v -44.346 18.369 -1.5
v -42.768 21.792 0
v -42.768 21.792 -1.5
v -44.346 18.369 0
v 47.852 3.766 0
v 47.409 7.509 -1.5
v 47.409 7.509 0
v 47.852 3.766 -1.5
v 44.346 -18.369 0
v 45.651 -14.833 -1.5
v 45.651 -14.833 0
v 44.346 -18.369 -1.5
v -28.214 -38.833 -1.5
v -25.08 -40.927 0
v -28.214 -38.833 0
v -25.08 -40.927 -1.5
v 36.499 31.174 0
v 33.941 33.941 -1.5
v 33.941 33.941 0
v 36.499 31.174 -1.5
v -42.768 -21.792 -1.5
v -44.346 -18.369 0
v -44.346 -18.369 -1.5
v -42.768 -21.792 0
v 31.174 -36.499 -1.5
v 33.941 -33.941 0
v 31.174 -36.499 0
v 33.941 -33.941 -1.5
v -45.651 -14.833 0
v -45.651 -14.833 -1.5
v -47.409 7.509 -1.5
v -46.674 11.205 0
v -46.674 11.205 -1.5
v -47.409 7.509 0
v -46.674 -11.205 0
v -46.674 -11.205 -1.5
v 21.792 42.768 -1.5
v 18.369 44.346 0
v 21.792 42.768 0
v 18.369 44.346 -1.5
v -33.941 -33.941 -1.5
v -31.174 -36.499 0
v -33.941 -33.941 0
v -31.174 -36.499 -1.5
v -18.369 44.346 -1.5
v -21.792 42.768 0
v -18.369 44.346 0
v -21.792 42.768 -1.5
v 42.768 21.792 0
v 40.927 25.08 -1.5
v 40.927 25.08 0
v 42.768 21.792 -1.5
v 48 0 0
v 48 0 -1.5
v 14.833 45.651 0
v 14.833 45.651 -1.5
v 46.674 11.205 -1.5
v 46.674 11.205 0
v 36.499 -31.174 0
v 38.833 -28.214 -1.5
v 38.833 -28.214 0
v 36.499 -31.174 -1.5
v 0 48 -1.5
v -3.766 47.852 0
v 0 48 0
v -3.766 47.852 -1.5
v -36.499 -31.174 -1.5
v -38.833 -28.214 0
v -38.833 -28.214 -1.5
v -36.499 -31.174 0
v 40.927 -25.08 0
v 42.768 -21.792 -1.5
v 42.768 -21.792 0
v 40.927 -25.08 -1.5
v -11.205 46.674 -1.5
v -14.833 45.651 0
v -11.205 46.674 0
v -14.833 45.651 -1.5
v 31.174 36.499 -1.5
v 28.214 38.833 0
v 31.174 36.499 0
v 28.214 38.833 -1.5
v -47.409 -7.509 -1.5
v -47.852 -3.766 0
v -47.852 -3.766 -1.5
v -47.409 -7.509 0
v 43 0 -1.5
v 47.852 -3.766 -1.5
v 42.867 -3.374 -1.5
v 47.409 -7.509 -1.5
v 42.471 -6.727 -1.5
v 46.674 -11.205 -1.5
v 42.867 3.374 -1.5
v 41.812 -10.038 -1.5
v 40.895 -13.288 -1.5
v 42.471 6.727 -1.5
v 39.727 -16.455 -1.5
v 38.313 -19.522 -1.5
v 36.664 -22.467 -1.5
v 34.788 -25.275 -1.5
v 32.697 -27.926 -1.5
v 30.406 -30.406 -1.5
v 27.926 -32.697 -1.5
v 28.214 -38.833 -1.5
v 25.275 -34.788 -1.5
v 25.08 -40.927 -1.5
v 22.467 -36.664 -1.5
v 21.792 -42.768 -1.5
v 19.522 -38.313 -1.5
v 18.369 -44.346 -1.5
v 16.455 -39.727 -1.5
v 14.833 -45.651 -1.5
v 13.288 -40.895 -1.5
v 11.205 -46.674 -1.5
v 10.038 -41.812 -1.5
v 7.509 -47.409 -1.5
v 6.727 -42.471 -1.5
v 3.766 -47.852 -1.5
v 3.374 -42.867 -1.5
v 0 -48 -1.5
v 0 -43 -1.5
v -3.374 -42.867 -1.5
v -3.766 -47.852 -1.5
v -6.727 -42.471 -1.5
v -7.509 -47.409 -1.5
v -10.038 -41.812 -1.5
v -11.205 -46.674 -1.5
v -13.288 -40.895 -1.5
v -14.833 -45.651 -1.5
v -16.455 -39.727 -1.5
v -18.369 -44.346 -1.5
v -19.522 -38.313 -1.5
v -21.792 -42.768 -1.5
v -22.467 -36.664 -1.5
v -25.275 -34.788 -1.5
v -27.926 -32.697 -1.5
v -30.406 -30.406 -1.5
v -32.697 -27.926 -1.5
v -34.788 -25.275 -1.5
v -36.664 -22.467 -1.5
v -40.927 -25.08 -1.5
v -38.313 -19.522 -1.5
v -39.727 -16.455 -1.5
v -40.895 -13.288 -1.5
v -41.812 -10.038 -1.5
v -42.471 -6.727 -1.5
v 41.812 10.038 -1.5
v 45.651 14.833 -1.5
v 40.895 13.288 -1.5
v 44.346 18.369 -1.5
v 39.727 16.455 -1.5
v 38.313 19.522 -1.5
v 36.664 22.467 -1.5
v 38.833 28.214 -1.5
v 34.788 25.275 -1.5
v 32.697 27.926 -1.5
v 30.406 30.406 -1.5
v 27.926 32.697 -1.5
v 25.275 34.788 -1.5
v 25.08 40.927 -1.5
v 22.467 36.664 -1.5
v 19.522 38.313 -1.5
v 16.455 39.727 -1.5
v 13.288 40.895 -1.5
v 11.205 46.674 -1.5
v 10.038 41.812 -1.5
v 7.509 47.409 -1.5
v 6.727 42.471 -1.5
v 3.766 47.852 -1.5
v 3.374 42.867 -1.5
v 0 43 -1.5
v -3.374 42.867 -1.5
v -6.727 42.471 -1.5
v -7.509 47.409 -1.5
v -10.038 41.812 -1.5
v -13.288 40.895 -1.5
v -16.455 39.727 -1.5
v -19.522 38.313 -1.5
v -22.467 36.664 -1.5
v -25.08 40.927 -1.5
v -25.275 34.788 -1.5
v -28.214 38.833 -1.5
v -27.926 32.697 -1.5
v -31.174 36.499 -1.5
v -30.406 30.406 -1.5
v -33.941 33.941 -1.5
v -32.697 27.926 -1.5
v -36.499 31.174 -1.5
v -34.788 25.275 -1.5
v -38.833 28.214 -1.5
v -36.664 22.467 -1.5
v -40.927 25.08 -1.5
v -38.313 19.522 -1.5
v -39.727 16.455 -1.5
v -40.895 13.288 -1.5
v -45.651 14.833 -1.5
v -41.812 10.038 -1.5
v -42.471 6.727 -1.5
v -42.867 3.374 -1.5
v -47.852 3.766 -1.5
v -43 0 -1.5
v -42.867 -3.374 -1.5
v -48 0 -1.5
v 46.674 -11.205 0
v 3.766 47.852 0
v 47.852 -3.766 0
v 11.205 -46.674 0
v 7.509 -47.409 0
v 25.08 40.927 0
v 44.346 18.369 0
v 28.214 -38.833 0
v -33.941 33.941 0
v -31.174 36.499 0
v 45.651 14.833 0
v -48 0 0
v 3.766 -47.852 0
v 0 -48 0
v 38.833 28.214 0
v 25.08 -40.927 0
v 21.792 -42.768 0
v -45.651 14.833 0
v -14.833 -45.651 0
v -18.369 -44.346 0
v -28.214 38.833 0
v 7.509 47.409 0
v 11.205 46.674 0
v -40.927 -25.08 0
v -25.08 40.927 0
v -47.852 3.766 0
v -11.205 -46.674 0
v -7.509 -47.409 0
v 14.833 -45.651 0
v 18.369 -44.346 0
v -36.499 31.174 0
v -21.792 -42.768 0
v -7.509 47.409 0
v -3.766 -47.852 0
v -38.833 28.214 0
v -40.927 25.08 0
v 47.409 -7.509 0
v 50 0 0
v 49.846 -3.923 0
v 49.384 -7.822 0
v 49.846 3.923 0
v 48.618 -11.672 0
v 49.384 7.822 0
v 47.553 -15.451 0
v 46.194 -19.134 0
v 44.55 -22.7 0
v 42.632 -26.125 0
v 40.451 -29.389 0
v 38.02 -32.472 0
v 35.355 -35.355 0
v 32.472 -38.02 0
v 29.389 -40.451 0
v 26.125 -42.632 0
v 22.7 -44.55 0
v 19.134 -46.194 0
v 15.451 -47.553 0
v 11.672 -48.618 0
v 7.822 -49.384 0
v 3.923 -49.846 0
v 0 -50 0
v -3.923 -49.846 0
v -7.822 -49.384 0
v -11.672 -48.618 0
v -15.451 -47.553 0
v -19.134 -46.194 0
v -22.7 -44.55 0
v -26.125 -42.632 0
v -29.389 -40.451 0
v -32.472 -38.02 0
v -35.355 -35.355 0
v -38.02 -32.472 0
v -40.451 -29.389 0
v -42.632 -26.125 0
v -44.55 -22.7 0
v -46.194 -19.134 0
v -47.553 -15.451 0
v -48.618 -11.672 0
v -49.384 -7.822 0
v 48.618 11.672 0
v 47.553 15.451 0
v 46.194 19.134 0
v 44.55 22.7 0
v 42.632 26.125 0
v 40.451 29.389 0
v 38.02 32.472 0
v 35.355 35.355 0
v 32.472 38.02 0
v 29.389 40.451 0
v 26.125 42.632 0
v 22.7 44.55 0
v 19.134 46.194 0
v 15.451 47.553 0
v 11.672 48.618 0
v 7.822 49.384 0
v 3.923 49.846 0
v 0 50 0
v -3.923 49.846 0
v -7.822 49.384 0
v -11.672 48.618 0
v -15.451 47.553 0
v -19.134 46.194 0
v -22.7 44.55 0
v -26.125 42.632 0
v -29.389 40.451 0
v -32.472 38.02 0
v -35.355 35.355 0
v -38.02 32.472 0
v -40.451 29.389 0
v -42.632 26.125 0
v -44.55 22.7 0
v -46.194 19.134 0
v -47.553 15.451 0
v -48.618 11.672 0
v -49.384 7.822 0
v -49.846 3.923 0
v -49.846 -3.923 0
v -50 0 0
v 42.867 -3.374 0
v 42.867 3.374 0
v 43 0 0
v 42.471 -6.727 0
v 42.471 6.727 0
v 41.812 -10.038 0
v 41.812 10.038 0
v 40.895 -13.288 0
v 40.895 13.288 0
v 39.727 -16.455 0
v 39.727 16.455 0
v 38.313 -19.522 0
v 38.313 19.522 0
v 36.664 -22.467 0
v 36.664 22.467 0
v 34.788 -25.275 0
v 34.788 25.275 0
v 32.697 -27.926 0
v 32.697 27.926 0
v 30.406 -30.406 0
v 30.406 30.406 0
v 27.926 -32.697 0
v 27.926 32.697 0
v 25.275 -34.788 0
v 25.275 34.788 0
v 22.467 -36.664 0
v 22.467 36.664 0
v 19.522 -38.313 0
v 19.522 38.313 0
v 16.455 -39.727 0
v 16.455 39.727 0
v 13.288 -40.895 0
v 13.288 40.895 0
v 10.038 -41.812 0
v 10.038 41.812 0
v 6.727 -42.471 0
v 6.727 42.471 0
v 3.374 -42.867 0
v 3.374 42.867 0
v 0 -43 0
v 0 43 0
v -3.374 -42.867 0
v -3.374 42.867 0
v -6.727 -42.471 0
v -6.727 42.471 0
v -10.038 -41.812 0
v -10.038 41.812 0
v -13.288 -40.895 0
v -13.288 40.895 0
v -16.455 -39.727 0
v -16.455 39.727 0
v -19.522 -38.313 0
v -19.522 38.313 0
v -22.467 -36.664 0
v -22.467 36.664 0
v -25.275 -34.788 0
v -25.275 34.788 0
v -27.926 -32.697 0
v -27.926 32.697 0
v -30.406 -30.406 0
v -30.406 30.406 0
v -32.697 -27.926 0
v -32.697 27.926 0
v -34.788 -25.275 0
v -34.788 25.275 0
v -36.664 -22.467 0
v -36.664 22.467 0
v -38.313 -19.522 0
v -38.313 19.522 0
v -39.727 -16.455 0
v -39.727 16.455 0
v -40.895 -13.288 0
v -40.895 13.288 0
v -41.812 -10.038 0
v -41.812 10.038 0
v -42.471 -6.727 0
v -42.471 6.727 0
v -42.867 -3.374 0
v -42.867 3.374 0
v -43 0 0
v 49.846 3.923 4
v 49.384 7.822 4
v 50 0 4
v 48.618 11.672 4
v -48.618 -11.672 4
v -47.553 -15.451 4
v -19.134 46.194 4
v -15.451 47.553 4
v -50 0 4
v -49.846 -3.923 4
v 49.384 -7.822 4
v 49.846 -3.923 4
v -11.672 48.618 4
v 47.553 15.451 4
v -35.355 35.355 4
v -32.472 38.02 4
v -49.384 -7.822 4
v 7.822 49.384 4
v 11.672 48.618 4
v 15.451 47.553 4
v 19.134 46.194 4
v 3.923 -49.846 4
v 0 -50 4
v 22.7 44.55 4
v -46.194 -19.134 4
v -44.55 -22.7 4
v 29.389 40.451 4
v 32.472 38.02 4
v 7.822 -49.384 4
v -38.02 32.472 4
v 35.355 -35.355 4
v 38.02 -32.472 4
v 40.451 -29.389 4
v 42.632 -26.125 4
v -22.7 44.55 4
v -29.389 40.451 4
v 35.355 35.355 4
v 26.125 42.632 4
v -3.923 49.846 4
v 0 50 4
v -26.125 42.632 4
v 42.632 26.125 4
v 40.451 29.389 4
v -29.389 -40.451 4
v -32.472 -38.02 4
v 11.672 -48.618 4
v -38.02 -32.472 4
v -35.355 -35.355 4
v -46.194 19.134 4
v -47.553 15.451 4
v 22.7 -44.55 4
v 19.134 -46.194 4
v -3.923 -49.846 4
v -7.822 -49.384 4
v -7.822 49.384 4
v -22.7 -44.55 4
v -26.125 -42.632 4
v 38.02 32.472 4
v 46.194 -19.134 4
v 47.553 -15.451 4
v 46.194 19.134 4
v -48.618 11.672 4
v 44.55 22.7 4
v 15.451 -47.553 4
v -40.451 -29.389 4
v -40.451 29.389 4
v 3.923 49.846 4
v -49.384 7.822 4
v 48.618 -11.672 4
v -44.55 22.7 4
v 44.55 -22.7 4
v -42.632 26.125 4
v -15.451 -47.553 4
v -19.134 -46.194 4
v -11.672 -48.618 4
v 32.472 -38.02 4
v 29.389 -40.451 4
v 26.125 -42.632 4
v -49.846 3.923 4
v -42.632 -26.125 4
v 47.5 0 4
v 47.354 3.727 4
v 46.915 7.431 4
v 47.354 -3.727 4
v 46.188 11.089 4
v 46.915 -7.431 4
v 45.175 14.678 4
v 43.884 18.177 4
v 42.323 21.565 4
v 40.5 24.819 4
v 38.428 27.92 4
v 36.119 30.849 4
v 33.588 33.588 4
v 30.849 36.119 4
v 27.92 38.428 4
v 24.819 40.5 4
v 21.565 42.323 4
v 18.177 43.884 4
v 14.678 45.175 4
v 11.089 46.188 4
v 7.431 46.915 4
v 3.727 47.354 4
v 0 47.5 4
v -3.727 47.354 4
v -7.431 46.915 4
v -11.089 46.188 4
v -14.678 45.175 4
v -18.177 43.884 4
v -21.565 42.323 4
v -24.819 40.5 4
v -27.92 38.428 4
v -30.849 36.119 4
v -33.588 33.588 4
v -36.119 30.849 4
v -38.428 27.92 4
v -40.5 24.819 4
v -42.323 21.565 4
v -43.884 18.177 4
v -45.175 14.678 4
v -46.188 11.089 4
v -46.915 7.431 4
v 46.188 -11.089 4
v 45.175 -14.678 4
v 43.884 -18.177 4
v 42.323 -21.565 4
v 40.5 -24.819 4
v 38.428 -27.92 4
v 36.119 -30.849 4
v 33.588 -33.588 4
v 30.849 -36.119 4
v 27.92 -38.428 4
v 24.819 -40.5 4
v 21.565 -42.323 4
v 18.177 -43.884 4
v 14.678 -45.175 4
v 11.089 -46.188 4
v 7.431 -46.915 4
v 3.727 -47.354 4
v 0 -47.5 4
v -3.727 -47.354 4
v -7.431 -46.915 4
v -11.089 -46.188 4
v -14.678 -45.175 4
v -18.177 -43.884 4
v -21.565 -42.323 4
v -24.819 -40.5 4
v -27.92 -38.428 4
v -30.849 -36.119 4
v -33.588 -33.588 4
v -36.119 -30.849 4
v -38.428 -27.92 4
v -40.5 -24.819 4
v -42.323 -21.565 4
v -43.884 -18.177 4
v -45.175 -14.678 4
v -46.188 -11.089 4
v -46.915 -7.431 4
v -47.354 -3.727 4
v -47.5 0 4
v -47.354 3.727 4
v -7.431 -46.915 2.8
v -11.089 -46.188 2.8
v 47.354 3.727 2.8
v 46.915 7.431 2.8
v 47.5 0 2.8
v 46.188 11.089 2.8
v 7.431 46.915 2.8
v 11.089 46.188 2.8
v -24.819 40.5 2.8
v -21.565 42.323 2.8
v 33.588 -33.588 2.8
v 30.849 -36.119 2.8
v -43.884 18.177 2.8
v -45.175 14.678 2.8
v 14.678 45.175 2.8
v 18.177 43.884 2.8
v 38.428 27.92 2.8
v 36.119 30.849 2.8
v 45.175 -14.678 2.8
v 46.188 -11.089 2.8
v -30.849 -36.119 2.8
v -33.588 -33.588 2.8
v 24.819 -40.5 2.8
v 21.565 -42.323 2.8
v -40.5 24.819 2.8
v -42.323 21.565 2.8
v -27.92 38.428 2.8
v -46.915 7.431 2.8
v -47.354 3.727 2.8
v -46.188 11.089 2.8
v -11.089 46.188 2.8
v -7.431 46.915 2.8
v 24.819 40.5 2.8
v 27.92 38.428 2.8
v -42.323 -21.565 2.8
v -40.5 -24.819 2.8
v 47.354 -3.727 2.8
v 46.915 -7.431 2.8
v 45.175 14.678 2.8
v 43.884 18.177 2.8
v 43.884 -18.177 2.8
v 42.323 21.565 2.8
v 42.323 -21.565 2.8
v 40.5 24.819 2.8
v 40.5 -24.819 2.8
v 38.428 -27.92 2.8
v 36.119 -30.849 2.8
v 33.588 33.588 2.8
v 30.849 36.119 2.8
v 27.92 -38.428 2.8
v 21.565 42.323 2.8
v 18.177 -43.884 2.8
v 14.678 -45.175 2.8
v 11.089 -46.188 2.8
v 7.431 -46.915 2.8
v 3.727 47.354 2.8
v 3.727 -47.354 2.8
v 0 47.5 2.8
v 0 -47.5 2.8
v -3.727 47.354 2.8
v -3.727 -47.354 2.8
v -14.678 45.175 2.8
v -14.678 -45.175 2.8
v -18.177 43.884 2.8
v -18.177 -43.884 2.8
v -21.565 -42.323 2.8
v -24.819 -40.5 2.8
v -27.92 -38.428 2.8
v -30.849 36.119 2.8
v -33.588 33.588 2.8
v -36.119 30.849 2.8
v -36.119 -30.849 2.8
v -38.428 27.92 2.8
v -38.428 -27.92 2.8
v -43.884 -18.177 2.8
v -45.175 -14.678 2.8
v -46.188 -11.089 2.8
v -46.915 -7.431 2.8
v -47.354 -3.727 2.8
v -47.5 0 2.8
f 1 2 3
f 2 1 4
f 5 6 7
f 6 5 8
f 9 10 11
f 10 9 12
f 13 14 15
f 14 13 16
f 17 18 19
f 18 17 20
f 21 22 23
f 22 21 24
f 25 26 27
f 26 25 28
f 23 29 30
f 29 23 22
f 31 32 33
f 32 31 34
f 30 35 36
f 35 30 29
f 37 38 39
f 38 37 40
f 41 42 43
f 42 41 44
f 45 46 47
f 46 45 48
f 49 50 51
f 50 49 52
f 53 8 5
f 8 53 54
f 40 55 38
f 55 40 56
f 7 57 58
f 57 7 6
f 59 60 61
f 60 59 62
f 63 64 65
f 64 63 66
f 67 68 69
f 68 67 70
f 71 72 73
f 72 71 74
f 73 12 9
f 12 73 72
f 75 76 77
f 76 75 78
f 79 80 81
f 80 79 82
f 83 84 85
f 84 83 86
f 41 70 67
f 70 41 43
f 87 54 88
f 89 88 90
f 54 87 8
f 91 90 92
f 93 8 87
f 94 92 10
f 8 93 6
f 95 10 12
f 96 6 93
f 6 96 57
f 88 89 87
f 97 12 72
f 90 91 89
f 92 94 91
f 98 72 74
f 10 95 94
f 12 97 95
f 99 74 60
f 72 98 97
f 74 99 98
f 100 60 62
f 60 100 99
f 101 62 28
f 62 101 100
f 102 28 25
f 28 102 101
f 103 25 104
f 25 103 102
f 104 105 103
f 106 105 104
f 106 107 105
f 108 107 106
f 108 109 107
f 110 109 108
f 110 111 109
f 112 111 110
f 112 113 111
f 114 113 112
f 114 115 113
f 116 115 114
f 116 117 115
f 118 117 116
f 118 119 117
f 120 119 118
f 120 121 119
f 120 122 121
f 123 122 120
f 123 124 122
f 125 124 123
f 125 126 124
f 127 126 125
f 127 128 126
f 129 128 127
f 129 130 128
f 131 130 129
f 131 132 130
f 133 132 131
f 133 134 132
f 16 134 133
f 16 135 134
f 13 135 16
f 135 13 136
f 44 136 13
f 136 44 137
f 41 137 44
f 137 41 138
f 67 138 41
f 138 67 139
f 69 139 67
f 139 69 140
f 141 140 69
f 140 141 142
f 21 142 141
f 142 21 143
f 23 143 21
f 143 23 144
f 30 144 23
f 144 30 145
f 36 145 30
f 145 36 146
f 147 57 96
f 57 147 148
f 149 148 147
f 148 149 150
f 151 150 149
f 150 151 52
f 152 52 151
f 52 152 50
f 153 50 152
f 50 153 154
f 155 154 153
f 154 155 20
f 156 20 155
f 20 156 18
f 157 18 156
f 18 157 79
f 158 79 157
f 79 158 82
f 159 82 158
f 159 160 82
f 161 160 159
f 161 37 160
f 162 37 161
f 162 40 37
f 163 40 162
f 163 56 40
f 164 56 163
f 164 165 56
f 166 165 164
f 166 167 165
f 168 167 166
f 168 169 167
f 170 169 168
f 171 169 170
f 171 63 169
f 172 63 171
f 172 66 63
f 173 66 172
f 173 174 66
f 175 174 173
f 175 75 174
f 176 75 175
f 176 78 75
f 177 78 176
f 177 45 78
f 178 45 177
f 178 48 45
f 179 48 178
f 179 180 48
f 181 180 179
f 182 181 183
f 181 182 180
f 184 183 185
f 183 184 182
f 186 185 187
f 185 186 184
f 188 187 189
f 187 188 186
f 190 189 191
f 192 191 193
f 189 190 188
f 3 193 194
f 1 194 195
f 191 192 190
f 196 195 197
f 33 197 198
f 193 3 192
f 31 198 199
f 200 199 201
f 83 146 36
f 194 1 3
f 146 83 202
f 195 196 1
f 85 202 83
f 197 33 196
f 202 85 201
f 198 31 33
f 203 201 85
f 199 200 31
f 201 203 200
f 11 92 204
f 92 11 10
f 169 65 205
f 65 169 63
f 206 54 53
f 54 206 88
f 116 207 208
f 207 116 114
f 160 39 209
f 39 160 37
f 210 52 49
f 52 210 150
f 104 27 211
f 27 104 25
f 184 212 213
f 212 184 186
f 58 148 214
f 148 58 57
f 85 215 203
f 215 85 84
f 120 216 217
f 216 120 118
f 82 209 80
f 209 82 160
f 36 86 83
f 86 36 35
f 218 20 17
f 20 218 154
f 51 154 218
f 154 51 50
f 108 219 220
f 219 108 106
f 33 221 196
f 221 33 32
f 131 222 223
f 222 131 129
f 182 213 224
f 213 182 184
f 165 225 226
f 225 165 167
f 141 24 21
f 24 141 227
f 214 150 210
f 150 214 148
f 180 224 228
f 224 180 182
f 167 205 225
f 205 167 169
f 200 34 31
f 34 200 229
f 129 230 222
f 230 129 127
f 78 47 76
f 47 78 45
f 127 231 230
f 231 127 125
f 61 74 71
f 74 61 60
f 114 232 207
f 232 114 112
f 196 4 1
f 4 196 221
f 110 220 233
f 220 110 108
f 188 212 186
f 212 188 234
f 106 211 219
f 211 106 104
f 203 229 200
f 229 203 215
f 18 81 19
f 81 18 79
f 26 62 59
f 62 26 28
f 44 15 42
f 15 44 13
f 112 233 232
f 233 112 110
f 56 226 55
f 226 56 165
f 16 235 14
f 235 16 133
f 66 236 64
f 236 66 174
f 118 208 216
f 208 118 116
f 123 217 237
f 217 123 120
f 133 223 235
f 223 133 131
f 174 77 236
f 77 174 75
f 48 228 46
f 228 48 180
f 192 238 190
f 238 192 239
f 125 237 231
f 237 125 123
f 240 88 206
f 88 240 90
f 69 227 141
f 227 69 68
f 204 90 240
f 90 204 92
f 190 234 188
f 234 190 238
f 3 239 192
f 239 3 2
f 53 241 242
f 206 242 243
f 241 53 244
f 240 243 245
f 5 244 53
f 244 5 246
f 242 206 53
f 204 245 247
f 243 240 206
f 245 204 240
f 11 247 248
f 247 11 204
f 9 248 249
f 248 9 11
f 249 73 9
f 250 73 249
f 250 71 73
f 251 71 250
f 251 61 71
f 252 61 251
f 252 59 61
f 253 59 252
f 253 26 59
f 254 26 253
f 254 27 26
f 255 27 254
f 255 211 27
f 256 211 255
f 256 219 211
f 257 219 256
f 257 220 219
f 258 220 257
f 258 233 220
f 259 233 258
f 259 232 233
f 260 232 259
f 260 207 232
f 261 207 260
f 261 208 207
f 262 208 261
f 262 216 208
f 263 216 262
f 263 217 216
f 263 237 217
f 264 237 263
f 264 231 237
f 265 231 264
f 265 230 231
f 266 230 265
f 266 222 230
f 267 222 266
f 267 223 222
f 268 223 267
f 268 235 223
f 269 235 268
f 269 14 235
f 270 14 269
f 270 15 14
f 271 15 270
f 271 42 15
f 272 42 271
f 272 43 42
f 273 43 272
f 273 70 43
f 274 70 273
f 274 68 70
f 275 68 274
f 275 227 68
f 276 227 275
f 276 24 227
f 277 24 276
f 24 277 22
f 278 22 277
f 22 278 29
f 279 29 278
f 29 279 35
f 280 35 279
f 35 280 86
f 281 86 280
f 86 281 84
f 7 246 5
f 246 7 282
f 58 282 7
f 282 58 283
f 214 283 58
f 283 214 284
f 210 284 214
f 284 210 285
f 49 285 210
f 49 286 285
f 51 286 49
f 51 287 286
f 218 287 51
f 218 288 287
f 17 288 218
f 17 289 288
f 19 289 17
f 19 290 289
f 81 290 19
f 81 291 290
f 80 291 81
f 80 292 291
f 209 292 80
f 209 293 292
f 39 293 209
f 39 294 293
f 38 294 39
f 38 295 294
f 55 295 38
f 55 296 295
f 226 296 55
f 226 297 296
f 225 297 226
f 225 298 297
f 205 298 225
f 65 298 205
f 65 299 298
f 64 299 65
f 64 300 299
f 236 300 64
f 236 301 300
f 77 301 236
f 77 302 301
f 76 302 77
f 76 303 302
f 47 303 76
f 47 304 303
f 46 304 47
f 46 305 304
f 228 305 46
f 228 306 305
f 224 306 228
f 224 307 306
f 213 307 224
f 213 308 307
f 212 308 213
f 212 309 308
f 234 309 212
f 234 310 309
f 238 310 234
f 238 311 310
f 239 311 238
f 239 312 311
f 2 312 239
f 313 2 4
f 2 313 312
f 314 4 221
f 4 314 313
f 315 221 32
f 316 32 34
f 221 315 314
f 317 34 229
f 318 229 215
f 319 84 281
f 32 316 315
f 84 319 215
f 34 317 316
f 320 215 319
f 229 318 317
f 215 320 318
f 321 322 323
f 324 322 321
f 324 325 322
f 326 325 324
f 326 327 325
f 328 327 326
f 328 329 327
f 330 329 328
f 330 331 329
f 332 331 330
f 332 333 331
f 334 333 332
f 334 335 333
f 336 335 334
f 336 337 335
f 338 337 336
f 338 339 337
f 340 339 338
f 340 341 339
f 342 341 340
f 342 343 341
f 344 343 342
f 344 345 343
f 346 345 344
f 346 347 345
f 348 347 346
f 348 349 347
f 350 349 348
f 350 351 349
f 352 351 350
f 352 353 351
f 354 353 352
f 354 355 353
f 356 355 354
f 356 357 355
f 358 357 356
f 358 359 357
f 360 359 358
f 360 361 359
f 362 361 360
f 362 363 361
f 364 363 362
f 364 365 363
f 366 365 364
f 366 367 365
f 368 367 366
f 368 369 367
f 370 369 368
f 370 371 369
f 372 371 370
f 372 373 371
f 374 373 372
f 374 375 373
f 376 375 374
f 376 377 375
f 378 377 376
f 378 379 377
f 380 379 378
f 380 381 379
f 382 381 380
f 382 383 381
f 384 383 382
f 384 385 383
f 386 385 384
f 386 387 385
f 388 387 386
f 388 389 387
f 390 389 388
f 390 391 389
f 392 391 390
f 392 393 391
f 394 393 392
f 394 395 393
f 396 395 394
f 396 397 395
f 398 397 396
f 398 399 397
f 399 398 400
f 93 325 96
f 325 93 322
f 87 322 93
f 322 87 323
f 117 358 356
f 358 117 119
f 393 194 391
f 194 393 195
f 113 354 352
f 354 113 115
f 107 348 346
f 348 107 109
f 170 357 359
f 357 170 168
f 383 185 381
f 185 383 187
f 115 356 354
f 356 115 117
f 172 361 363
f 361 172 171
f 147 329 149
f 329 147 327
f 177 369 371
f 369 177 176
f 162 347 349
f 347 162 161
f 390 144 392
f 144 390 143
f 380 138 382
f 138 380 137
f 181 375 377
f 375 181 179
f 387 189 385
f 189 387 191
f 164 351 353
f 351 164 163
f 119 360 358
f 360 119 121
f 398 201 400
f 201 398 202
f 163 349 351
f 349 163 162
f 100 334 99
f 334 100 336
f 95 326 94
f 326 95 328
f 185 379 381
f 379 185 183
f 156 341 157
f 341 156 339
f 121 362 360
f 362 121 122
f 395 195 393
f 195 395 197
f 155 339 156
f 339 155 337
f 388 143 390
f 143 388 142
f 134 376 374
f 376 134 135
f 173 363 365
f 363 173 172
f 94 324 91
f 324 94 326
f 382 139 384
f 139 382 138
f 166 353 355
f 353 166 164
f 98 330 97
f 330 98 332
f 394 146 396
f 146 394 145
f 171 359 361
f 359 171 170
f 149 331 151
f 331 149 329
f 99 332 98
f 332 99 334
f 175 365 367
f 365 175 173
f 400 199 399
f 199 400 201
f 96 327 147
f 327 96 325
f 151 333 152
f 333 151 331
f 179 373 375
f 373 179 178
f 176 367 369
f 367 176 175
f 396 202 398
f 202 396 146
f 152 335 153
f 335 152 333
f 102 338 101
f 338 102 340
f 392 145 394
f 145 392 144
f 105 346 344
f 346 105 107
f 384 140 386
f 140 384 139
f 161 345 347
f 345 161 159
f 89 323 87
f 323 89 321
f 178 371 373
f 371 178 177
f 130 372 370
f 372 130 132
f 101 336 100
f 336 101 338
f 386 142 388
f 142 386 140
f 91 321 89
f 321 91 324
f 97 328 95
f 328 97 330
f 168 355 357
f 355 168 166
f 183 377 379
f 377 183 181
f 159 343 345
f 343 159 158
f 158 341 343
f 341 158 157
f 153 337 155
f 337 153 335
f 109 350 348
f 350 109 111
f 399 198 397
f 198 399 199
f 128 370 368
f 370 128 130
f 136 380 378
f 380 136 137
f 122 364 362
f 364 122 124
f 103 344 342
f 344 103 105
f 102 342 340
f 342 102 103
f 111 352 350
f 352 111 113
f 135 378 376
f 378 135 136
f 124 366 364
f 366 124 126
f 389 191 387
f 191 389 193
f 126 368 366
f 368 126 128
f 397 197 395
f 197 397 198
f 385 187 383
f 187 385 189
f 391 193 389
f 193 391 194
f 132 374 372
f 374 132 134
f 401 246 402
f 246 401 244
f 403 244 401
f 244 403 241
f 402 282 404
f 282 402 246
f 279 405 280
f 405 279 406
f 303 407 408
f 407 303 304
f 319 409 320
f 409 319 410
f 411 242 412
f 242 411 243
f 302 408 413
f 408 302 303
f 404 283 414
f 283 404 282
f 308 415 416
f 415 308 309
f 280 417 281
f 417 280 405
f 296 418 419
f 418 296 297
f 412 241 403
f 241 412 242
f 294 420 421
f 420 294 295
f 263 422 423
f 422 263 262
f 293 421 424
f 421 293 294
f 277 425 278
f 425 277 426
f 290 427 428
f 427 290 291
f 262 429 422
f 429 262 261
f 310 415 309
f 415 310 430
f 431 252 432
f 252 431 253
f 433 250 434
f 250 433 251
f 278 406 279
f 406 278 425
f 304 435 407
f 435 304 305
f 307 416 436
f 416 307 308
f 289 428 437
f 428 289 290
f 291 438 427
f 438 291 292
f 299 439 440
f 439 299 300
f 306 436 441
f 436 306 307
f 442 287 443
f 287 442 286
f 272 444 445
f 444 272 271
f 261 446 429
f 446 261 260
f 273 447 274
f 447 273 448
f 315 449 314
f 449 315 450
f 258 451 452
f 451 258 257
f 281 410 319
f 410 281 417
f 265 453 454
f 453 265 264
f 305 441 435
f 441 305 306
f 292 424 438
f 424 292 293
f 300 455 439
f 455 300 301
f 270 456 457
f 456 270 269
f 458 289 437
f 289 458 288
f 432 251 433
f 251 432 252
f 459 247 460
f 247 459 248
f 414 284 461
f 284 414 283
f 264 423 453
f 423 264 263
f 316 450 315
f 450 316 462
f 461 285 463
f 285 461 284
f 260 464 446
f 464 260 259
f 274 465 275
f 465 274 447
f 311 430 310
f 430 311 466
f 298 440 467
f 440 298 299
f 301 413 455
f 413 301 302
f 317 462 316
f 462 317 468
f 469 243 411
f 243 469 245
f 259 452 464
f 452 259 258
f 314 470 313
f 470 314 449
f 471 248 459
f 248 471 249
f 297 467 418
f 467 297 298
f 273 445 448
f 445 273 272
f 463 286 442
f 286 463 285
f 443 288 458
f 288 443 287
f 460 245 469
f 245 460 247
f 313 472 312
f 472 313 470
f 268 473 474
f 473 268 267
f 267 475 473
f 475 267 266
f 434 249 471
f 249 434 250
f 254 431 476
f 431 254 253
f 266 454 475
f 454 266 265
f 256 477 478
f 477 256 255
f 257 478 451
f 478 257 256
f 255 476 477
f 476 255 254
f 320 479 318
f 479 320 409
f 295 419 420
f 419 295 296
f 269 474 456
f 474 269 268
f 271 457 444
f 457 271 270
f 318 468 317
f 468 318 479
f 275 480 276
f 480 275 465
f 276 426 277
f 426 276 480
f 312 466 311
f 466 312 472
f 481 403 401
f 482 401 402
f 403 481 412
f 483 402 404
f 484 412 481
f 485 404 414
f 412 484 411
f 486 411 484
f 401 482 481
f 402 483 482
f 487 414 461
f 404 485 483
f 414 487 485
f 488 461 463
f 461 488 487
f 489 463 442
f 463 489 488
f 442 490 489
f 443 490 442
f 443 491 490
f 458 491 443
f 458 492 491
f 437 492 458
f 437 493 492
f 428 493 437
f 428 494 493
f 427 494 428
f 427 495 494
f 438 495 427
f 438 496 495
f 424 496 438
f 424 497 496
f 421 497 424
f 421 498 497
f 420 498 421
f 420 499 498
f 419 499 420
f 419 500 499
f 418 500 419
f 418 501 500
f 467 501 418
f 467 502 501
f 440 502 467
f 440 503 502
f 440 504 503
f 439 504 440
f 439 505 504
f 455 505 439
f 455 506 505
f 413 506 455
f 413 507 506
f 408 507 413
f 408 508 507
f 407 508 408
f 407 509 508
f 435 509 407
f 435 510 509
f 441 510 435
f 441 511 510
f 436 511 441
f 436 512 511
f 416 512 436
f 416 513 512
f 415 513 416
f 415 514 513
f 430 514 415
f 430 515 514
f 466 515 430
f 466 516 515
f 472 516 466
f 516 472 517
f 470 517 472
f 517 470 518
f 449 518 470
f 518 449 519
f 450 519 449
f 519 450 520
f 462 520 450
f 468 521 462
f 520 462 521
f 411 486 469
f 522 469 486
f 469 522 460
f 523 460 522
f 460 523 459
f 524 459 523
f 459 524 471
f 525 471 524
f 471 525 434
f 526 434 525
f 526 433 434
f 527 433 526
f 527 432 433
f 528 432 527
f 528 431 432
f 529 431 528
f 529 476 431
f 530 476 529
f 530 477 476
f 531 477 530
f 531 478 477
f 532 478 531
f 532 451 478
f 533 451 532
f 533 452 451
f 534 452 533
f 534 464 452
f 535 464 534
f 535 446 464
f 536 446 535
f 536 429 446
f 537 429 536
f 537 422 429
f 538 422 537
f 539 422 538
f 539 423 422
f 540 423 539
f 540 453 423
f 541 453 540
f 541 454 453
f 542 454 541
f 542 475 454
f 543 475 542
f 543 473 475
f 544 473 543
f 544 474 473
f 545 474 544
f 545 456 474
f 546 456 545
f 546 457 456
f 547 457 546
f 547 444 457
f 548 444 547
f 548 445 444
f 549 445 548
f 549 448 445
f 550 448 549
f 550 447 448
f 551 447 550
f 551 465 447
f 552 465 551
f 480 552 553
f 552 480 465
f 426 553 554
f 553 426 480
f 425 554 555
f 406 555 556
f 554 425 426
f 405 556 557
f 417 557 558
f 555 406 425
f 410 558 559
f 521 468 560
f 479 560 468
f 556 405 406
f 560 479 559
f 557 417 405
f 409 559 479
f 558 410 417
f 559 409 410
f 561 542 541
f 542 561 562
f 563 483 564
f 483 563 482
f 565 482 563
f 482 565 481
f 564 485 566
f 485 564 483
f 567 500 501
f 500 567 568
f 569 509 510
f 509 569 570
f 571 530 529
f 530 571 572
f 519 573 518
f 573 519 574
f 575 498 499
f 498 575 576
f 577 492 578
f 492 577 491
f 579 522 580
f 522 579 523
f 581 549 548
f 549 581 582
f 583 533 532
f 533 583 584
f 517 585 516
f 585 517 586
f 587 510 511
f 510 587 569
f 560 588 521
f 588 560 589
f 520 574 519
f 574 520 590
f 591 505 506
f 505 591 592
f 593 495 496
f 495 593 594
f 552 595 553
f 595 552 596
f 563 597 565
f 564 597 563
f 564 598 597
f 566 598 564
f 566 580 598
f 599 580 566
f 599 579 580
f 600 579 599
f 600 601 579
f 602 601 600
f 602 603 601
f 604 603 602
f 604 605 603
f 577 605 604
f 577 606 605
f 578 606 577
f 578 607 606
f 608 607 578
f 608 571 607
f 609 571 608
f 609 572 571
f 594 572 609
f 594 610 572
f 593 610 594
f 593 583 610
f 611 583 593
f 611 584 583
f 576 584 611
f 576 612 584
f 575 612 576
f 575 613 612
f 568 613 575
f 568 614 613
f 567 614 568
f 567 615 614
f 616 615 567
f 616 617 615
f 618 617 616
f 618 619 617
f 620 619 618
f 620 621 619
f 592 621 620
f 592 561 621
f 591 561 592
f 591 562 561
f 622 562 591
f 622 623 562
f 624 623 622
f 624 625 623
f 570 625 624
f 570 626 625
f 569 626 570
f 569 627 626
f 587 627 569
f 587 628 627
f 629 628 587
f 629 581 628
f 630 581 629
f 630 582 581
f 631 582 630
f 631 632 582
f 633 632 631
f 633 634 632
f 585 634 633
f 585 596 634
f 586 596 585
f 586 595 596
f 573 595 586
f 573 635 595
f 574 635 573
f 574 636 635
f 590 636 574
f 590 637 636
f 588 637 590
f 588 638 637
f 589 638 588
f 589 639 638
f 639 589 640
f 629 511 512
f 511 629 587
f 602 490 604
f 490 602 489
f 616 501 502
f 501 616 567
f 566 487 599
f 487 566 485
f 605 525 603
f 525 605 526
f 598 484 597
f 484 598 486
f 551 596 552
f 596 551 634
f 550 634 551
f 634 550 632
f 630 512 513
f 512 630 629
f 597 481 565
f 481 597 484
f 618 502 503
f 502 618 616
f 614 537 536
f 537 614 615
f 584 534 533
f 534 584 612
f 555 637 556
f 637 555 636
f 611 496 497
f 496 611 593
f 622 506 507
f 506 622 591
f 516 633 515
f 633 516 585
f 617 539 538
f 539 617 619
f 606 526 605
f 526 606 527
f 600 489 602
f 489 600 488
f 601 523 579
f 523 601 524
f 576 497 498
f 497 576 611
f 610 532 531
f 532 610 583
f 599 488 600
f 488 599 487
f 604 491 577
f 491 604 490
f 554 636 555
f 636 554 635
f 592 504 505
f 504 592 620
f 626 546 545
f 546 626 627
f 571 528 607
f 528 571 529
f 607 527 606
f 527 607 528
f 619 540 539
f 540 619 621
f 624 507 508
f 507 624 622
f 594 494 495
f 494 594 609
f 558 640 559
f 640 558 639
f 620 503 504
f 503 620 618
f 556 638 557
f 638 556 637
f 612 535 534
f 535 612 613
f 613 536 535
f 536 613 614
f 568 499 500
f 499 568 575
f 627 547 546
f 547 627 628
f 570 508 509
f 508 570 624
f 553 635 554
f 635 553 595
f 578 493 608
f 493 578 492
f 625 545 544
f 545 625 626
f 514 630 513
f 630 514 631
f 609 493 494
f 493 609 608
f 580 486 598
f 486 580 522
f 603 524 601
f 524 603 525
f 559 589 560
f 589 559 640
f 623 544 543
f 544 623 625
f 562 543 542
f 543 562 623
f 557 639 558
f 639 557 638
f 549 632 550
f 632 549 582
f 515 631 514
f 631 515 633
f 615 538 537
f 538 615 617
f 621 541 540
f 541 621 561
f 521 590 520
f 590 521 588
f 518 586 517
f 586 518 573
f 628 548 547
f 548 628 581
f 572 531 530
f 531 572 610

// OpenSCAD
// Topographic Coaster — DUAL COLOR
// File 1/2: Base layer (Color 1 — e.g. wood PLA)
// File 2/2: topo_lines.scad (Color 2 — e.g. black PETG)
// BambuStudio: import both STLs, assign AMS slot 1 & 2
// P2S Combo: 0.2mm, 3 walls, 20% infill, no supports

D      = 100;  // Coaster diameter
H_BASE = 4;    // Base thickness
WALL_T = 2.5;
FOOT_H = 1.5;

difference() {
    union() {
        cylinder(d = D, h = H_BASE, $fn = 80);
        // Anti-slip feet ring
        translate([0, 0, -FOOT_H])
            difference() {
                cylinder(d = D - 4, h = FOOT_H, $fn = 80);
                cylinder(d = D - 14, h = FOOT_H + 1, $fn = 80);
            }
    }
    // Recessed pocket for topo lines (Color 2 sits flush)
    translate([0, 0, H_BASE - 1.2])
        cylinder(d = D - WALL_T*2, h = 1.4, $fn = 80);
}
